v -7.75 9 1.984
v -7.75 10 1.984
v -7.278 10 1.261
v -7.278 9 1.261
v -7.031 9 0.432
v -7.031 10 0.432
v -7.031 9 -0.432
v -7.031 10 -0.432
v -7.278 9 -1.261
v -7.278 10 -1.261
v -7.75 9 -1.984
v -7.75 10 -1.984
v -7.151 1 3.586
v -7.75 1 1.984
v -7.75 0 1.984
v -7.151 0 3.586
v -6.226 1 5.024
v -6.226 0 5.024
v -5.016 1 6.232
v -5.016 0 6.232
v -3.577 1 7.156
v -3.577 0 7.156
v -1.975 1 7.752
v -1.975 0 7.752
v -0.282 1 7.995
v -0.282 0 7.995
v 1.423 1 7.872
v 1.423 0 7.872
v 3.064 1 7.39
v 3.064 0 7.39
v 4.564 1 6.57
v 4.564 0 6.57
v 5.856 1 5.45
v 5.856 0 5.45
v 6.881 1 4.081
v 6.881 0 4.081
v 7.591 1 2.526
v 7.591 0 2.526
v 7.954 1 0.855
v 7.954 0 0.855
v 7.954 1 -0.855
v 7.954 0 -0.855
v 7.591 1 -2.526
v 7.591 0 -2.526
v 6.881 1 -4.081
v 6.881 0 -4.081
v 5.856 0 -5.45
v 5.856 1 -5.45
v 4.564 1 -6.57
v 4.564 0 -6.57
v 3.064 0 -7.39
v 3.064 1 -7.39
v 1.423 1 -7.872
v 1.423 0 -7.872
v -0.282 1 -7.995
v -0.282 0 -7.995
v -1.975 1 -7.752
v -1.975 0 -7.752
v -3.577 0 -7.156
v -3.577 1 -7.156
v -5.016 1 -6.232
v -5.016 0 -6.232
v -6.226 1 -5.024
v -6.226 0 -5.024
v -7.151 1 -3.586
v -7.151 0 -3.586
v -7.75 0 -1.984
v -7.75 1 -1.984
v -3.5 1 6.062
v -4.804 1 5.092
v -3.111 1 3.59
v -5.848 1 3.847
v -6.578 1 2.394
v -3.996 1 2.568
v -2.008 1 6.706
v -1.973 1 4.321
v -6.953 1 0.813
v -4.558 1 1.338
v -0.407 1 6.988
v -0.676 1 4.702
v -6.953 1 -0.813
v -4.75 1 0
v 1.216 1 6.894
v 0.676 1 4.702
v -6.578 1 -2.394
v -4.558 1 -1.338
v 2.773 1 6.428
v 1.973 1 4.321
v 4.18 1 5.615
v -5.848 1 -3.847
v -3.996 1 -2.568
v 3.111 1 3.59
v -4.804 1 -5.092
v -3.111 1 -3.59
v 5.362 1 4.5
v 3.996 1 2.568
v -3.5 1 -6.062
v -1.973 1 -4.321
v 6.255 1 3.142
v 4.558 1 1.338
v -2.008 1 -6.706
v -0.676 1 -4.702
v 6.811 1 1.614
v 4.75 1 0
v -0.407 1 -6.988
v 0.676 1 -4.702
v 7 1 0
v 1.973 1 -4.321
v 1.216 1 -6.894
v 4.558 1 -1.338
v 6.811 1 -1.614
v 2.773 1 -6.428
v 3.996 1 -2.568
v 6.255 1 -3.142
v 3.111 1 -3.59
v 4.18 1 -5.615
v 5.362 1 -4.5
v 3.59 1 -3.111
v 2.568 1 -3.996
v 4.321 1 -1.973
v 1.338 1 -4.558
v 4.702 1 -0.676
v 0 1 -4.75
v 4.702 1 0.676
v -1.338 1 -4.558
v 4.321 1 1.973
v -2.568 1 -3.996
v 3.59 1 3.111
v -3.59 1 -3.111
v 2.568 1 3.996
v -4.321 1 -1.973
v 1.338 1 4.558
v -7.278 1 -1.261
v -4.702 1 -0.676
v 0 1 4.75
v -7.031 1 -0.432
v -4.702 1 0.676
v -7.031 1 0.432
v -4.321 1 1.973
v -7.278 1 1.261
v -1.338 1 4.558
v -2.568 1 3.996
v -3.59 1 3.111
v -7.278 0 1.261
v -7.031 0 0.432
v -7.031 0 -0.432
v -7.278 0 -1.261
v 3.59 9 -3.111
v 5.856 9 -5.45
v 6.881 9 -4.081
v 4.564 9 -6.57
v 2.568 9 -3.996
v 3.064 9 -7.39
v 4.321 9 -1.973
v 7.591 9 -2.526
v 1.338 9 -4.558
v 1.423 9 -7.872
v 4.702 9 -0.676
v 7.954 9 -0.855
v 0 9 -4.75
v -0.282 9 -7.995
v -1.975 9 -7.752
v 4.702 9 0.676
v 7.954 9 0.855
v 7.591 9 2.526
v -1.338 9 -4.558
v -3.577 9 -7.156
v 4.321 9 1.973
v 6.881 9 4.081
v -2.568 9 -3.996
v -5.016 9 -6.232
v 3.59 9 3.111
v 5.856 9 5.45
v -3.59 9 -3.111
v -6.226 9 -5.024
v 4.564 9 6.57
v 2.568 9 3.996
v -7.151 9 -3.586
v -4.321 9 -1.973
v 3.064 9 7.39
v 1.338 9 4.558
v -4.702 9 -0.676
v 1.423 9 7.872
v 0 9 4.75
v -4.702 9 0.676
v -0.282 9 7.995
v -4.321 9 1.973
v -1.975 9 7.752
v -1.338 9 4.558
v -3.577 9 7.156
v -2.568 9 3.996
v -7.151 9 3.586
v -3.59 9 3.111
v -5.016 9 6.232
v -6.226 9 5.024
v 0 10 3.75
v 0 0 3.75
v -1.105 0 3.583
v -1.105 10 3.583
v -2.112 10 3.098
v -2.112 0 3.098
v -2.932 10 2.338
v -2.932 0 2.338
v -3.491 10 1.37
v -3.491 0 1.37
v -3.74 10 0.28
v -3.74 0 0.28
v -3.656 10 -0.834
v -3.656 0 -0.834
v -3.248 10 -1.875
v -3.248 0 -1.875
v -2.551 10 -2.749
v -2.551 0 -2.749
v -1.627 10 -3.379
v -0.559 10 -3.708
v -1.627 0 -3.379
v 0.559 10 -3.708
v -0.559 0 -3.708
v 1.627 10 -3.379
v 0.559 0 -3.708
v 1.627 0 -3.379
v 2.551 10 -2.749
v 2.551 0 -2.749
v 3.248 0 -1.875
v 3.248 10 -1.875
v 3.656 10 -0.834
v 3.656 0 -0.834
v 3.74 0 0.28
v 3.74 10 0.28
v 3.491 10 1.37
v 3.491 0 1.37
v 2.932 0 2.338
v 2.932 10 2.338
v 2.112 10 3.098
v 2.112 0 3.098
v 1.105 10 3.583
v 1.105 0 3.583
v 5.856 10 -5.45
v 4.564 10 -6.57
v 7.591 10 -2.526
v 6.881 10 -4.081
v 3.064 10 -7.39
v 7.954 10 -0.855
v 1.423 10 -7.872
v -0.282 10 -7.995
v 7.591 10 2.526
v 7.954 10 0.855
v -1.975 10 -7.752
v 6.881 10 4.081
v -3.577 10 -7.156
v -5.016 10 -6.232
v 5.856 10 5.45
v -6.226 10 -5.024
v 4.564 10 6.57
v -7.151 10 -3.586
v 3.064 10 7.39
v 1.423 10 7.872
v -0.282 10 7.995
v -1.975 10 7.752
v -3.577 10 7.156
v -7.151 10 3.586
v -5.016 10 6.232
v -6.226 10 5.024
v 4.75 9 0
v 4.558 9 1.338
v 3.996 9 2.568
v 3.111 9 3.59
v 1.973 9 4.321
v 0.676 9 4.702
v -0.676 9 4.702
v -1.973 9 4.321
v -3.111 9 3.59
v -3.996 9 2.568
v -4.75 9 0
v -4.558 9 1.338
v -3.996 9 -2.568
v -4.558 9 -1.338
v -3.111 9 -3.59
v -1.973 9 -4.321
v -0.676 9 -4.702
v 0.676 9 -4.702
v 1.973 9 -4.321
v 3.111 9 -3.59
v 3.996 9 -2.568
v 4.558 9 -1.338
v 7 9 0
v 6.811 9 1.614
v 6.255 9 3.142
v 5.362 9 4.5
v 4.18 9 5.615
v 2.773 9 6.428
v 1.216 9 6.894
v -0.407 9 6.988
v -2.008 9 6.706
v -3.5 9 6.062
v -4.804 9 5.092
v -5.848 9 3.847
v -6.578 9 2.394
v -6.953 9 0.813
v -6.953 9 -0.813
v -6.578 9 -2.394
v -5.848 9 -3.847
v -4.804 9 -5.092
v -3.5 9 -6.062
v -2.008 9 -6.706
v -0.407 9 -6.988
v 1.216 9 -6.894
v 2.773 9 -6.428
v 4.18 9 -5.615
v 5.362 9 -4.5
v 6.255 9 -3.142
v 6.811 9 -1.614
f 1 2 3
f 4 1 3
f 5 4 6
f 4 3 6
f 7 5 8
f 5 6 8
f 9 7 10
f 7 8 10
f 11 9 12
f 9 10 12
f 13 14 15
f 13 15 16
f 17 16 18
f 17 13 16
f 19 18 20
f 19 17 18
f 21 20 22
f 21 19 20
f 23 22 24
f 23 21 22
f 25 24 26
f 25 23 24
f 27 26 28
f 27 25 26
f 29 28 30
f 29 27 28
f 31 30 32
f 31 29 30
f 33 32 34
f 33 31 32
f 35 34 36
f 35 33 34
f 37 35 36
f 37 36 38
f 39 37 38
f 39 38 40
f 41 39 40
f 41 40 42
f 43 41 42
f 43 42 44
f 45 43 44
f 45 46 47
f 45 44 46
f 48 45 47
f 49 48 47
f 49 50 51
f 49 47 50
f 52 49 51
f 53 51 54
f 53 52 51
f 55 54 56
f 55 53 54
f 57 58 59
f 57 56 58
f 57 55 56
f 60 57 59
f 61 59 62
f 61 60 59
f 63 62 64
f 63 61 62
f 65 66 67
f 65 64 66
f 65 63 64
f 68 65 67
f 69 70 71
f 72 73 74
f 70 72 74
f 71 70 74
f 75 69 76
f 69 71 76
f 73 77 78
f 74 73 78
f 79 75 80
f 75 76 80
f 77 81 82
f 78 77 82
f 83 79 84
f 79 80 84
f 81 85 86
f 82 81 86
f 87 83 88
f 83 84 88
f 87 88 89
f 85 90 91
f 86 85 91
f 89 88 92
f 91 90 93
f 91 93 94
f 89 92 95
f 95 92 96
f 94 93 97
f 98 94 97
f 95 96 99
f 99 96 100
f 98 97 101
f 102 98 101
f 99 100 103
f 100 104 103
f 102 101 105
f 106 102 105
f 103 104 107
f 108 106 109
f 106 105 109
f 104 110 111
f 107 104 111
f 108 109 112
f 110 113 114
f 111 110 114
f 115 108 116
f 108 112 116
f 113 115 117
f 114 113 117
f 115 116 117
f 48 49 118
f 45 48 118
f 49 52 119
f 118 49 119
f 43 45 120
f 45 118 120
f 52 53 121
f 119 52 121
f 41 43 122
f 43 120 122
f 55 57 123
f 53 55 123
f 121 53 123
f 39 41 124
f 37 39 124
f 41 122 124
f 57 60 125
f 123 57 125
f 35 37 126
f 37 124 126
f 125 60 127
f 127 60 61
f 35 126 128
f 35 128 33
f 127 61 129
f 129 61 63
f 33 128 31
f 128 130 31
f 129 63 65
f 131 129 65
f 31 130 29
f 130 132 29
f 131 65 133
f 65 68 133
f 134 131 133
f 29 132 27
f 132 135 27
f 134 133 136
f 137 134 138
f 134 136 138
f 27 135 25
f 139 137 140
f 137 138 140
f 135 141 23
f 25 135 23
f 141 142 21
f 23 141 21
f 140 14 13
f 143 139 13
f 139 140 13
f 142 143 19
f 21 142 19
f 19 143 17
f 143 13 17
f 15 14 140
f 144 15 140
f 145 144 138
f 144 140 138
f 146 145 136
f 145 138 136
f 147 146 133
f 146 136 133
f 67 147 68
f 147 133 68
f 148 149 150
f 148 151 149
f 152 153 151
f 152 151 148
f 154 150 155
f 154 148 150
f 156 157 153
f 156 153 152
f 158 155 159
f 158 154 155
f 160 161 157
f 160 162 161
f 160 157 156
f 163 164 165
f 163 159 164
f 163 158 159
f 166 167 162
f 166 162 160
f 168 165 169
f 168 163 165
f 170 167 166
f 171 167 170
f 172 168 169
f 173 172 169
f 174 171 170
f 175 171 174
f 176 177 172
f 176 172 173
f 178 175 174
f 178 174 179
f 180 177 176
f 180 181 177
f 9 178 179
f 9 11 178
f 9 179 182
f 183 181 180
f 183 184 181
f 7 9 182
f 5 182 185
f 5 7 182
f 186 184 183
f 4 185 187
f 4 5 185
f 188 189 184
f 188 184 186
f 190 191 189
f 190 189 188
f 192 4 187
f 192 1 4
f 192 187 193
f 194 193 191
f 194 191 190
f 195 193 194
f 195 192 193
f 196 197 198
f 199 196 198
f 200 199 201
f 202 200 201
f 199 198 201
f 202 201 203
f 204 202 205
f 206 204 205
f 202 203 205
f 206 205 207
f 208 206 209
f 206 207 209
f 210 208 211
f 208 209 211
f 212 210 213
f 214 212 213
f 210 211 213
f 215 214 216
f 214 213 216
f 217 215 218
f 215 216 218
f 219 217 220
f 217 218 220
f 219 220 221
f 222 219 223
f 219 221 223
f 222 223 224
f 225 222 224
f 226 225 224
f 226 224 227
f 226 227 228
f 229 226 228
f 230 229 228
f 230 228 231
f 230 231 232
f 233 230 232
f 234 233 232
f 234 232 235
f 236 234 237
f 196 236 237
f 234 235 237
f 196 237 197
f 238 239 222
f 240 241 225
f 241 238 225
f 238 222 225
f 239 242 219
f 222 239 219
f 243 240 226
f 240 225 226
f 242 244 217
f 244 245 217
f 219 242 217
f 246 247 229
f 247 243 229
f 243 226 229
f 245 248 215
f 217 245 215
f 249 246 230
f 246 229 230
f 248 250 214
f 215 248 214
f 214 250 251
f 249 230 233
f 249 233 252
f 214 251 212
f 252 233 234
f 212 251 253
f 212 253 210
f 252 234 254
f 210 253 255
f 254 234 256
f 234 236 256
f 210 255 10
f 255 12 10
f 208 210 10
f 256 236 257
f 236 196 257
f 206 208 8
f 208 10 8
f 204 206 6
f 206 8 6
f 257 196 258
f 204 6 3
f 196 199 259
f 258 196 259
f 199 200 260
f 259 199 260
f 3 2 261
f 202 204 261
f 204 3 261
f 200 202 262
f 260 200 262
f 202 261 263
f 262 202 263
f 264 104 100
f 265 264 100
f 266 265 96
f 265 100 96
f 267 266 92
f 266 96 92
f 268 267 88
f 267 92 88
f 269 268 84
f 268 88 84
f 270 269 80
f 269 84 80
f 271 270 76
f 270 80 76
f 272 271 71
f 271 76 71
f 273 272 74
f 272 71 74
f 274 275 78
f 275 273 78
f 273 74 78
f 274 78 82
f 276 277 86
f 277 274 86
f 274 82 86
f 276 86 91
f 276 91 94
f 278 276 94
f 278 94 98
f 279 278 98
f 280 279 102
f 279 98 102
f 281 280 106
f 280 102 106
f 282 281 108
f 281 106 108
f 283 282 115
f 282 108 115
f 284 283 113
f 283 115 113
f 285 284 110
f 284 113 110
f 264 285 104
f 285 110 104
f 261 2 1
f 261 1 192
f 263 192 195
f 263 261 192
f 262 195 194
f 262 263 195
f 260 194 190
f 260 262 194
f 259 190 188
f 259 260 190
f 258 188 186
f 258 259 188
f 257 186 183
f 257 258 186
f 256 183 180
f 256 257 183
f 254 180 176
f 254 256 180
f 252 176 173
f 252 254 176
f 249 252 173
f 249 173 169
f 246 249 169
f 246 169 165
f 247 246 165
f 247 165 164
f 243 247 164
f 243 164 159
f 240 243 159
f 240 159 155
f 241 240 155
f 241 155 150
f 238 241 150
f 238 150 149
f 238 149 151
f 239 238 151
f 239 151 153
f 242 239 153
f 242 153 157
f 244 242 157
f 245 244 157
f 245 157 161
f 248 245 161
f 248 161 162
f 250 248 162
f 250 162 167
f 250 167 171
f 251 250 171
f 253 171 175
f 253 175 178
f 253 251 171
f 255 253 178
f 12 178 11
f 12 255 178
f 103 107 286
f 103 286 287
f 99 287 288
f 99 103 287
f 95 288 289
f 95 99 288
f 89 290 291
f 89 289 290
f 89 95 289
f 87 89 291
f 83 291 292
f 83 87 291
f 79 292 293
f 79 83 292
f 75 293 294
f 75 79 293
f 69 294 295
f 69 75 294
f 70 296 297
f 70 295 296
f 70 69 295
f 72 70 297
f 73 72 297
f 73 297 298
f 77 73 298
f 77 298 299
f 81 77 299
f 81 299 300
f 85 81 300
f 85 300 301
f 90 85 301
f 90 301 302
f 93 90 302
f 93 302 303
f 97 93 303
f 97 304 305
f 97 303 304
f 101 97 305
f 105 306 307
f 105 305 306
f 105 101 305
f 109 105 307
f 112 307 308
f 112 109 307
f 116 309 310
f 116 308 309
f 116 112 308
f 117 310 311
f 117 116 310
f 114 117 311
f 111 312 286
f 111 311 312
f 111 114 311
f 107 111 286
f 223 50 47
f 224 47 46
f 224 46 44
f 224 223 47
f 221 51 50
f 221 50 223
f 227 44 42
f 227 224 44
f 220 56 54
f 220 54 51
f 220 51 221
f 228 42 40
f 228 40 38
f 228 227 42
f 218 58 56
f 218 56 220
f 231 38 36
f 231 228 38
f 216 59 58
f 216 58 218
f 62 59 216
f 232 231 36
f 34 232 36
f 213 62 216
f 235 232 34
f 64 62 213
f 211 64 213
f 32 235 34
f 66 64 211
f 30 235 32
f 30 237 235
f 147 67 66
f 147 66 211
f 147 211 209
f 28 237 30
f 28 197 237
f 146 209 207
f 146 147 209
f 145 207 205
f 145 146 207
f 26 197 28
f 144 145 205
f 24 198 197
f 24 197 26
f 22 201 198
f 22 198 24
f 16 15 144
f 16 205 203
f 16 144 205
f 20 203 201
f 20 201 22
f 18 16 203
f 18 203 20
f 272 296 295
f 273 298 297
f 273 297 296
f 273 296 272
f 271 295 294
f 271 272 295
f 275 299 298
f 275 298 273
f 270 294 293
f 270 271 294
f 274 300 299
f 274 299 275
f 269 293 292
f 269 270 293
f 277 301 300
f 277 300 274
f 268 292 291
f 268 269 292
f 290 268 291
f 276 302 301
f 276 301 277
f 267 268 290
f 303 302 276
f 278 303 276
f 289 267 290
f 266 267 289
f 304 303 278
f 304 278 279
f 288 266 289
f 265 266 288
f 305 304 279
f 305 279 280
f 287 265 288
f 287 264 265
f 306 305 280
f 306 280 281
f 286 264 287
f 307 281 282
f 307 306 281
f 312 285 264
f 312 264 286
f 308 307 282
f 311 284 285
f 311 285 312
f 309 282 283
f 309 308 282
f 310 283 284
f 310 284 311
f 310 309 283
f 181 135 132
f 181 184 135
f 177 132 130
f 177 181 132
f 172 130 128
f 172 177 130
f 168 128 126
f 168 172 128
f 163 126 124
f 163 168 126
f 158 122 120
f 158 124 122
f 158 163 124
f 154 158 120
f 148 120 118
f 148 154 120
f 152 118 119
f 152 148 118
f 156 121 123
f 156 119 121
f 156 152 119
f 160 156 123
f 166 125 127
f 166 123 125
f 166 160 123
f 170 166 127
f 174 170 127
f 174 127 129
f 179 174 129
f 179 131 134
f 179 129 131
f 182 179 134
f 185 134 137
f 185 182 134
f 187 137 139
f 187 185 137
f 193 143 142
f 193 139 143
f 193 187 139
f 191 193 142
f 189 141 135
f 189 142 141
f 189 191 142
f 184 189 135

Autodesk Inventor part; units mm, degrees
ref_plane "YZ Plane" through (0, 0, 0) normal (1, 0, 0) x (0, 1, 0)
ref_plane "XZ Plane" through (0, 0, 0) normal (0, 1, 0) x (-1, 0, 0)
ref_plane "XY Plane" through (0, 0, 0) normal (0, 0, 1) x (1, 0, 0)
sketch "Эскиз1" plane through (0, 0, 0) normal (1, 0, 0) x (0, 1, 0)
  line L0 (0, 0) -> (0, 3.75) construction
  line L1 (0, 3.75) -> (0, 8)
  line L2 (0, 8) -> (1, 8)
  line L3 (1, 8) -> (1, 4.75)
  line L4 (1, 4.75) -> (9, 4.75)
  line L5 (9, 4.75) -> (9, 8)
  line L6 (9, 8) -> (10, 8)
  line L7 (10, 8) -> (10, 3.75)
  line L8 (10, 3.75) -> (0, 3.75)
  line L9 (13.294, 0) -> (-4.7382, 0) construction
  dimension "d0" = 3.75
  dimension "d1" = 4.25
  dimension "d2" = 1
  dimension "d3" = 3.25
  dimension "d4" = 8
  dimension "d5" = 1
  dimension "d6" = 4.25
revolve "Вращение1" add sketch "Эскиз1" angle 360 about axis through (0, 13.294, 0) along (0, -1, 0)
sketch "Эскиз2" plane through (0, 10, 0) normal (0, 1, 0) x (1, 0, 0)
  line L0 (0, 0) -> (-10, 0) construction
  circle A0 centre (-10, 0) radius 3
  dimension "d8" = 10
  dimension "d9" = 6
extrude "Выдавливание1" cut sketch "Эскиз2" against normal blind 10
sketch "Эскиз3" plane through (0, 1, 0) normal (0, 1, 0) x (1, 0, 0)
  circle A0 centre (0, 0) radius 7
  circle A1 centre (0, 0) radius 4.75
  dimension "d12" = 14
extrude "Выдавливание2" add sketch "Эскиз3" along normal blind 8 separate body
properties part number "Катушка"
